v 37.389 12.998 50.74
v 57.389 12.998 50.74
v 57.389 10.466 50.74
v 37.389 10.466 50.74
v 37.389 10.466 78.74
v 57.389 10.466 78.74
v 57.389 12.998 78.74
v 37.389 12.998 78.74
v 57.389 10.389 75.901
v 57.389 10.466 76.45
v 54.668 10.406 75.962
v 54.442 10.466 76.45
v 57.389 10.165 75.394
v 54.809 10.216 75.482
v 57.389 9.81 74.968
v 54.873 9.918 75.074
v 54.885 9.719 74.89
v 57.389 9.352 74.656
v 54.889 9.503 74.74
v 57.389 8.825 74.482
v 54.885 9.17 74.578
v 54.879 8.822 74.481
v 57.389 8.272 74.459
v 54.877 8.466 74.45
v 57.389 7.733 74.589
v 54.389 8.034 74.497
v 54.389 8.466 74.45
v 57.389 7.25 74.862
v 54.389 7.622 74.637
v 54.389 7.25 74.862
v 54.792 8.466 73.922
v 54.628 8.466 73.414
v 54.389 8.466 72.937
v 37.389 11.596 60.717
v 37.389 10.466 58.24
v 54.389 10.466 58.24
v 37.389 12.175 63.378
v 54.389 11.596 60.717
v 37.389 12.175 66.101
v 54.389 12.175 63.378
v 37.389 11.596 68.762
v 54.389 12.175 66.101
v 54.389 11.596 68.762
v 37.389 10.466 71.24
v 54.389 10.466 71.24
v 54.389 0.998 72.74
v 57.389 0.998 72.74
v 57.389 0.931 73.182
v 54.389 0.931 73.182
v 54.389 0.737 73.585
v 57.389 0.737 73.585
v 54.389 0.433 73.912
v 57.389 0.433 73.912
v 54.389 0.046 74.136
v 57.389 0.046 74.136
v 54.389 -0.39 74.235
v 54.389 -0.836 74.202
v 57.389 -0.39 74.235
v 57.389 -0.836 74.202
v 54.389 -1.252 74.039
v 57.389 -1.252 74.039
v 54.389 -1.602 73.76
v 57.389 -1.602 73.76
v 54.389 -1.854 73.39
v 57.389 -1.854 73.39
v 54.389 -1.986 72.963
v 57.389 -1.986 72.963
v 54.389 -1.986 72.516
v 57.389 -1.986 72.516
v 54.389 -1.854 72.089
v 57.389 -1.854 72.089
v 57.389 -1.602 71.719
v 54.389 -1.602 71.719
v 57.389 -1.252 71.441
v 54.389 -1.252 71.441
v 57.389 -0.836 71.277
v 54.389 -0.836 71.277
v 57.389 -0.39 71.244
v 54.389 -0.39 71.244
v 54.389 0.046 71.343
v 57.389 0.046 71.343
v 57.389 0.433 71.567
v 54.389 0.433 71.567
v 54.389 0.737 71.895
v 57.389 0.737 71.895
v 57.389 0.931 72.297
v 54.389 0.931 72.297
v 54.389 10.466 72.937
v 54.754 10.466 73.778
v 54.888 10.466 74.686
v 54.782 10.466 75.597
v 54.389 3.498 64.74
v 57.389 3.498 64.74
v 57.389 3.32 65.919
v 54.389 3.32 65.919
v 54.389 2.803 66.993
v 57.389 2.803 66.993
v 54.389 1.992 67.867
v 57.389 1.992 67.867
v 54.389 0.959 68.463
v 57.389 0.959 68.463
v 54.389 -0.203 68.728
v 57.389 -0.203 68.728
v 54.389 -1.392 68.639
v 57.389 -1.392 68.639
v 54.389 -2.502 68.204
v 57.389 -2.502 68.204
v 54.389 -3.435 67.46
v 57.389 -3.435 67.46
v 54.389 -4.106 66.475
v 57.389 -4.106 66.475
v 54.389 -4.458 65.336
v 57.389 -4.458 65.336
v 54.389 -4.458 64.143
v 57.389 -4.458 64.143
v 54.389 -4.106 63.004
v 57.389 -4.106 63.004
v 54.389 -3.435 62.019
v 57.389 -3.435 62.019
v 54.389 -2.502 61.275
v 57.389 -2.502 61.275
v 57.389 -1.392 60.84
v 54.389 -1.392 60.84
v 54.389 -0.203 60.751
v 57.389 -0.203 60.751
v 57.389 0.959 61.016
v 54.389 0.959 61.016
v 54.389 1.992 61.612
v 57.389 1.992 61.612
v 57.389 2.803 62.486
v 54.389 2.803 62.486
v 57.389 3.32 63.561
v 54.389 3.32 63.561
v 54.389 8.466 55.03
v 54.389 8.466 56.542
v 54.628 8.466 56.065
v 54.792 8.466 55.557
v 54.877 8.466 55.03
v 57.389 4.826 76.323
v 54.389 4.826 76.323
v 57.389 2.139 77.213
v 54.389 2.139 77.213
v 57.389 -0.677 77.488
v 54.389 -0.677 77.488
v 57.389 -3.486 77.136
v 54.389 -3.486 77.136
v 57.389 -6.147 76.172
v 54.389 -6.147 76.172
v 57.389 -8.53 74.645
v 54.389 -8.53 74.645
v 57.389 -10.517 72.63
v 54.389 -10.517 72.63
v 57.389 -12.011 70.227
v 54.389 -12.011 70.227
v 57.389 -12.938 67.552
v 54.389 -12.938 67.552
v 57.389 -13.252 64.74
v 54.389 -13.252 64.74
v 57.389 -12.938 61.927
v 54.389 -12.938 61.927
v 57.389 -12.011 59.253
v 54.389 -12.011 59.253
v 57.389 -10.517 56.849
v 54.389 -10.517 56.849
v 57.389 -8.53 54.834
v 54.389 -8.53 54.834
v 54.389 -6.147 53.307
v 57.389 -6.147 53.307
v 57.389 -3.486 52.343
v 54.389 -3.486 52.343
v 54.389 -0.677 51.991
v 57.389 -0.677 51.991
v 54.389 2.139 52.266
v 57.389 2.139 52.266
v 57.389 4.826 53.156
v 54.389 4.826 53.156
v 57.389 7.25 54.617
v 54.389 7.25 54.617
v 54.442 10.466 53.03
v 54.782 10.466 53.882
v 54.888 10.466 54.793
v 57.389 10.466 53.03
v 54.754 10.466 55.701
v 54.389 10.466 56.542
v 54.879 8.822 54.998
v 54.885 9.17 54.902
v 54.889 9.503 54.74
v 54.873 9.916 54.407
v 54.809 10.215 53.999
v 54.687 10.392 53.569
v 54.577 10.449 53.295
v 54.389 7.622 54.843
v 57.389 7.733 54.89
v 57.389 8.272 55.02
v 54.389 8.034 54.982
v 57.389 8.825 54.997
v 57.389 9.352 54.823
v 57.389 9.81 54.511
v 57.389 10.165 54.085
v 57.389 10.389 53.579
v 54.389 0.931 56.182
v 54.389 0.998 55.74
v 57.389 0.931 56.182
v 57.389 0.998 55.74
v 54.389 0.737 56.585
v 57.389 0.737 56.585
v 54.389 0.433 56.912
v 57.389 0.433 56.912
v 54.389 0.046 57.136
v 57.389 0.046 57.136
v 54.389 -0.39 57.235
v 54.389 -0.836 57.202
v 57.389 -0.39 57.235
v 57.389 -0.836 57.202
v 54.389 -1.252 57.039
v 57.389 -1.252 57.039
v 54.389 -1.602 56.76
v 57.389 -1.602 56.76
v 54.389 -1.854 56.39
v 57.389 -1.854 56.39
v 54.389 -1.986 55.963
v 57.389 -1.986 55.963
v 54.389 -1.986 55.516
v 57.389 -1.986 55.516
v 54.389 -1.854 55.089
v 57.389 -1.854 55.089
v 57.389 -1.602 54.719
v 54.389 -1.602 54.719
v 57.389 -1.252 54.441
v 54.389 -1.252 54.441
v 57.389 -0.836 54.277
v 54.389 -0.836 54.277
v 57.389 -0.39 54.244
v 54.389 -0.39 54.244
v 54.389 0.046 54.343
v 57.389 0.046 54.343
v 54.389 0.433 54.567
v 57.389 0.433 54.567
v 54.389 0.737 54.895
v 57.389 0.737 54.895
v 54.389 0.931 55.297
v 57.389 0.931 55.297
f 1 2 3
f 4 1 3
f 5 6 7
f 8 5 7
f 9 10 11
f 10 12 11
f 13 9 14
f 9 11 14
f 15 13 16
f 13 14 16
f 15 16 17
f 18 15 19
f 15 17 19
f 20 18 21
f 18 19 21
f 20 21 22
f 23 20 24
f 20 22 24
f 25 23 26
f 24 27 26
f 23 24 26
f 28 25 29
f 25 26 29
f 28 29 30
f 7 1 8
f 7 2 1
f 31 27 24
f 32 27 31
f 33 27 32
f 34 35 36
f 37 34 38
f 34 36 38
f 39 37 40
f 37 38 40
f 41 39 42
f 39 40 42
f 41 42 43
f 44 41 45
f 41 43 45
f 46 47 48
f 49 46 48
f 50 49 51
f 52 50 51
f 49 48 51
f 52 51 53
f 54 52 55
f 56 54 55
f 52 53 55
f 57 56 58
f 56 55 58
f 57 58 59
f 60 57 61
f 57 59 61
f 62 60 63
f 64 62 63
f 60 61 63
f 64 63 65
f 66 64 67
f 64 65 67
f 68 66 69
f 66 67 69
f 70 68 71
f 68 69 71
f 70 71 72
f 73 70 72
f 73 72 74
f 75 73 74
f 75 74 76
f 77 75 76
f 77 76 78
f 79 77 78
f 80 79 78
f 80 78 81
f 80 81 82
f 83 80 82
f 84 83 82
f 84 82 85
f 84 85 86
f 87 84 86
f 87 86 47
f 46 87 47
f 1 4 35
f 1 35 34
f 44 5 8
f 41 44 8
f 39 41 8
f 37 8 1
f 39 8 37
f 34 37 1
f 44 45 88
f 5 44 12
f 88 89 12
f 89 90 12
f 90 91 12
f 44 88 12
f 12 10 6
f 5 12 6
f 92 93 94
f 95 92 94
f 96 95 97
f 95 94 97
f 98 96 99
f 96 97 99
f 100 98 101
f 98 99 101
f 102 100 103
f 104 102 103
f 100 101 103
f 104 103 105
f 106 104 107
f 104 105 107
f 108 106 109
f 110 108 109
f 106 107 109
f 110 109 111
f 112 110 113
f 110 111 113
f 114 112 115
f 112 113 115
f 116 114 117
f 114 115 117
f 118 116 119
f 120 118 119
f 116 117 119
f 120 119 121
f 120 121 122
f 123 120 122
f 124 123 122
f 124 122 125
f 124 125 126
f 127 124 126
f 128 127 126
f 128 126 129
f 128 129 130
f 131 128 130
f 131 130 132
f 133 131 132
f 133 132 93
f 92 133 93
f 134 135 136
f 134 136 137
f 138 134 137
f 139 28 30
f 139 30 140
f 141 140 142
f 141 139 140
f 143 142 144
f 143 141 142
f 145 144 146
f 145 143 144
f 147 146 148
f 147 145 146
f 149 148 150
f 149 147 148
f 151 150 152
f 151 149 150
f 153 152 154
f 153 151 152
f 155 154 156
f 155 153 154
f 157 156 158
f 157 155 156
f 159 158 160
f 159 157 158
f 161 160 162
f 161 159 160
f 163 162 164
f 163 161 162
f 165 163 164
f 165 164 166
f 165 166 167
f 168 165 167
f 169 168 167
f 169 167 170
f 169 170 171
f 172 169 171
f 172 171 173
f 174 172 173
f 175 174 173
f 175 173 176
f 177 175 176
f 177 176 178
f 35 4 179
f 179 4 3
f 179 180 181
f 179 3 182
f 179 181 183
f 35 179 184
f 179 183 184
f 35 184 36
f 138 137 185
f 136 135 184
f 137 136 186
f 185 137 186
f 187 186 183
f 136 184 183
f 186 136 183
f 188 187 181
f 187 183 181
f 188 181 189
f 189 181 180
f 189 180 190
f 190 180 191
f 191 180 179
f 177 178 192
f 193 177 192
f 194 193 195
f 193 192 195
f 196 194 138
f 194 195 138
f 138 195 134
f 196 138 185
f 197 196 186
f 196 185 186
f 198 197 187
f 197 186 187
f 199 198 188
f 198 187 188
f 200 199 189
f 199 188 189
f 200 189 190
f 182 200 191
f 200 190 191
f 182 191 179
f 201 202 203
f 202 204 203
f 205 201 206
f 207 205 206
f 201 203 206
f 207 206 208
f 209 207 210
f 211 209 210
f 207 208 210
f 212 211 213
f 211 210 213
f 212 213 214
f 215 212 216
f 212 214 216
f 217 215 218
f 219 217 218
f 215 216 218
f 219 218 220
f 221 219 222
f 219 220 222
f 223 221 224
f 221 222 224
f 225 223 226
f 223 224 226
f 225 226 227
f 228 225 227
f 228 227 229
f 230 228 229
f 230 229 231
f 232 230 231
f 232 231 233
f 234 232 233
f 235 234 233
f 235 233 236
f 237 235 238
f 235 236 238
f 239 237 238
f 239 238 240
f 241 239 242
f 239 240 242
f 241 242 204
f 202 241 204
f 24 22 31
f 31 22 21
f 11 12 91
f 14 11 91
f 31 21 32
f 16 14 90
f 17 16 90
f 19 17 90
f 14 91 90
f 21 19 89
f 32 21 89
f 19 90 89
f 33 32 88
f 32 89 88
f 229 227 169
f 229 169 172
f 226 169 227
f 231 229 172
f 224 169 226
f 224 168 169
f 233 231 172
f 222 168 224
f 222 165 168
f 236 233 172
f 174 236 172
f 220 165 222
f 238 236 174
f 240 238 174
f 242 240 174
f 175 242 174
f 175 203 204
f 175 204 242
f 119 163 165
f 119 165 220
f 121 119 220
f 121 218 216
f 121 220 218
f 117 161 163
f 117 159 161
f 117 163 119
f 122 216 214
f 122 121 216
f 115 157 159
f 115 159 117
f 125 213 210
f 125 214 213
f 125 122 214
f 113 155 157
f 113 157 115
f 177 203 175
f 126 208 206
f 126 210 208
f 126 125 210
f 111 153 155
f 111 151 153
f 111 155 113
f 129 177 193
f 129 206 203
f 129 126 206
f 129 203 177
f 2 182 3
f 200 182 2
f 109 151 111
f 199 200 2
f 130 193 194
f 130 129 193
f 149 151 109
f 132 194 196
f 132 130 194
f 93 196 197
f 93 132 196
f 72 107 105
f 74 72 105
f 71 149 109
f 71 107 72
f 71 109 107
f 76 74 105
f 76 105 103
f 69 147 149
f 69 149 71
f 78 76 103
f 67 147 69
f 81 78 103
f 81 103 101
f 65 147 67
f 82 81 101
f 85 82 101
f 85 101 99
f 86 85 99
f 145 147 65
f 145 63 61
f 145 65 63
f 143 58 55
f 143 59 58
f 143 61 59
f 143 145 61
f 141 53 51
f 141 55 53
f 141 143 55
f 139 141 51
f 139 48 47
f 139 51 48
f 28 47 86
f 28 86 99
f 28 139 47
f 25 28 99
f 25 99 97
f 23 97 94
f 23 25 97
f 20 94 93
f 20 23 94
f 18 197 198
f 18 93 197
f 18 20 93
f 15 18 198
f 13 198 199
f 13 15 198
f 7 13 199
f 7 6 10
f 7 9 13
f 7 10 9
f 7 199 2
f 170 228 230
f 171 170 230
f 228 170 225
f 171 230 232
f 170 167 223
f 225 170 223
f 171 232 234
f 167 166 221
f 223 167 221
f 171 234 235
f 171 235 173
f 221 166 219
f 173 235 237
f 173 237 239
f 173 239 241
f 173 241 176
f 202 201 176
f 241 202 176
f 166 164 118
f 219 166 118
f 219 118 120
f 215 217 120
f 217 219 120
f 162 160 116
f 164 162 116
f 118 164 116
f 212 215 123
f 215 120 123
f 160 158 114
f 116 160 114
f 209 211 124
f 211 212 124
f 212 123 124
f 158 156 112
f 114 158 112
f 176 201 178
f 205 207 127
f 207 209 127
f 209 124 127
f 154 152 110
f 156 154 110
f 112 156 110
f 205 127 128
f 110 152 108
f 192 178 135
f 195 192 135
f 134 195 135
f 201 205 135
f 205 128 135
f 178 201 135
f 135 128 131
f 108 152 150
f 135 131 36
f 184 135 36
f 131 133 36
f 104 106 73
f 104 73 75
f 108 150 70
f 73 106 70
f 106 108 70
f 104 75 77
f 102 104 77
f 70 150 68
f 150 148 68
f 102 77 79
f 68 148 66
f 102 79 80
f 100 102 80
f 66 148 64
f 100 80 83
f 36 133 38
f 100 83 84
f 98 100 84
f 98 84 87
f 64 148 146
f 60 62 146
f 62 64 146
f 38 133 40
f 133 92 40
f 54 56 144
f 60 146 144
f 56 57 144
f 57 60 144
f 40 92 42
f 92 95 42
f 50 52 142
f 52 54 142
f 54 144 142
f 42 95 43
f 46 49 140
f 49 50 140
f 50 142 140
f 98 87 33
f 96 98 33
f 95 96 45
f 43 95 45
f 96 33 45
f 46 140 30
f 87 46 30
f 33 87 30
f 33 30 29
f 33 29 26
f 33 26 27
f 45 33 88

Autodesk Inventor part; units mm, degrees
ref_plane "YZ Plane" through (0, 0, 0) normal (1, 0, 0) x (0, 1, 0)
ref_plane "XZ Plane" through (0, 0, 0) normal (0, 1, 0) x (-1, 0, 0)
ref_plane "XY Plane" through (0, 0, 0) normal (0, 0, 1) x (1, 0, 0)
ref_plane "РабПлоскость1" through (57.3886, 15.9976, 24.7396) normal (1, 0, 0) x (0, 1, 0)
sketch "Эскиз1" plane through (57.3886, 15.9976, 24.7396) normal (1, 0, 0) x (0, 1, 0)
  circle A0 centre (-16.5, 48) radius 1.5
  circle A1 centre (-16.5, 31) radius 1.5
  circle A2 centre (-16.5, 40) radius 4
  line L0 (-3, 26) -> (-3, 54)
  circle A3 centre (-16.5, 40) radius 12.75
  line L1 (-3, 54) -> (-3, 26)
  line L2 (-3, 27.25) -> (-3, 52.75)
  line L3 (-3, 26) -> (-29.25, 26)
  line L4 (-29.25, 26) -> (-29.25, 54)
  line L5 (-29.25, 54) -> (-3, 54)
  line L6 (-3, 54) -> (-3, 26)
  line L7 (-5.5313, 46.5) -> (-5.5313, 54)
  line L8 (-3, 54) -> (-3, 26)
  line L9 (-5.5313, 26) -> (-5.5313, 33.5)
  point P0 (-15.9976, -24.7396)
  point P1 (-3, 26)
  dimension "d15" = 25.5
extrude "Выдавливание1" add sketch "Эскиз1" against normal blind 3 contours A3
extrude "Выдавливание2" add sketch "Эскиз1" against normal blind 20 contours L3 L9 A3 L7 L5 L0
fillet "Сопряжение1" radius 2 1 edges at (55.8886, 10.4663, 58.2396)
fillet "Сопряжение2" radius 2 1 edges at (55.8886, 10.4663, 71.2396)
sketch "Эскиз2" plane through (57.3886, 12.9976, 78.7396) normal (0, 1, 0) x (1, 0, 0)
  point P0 (-57.3886, 78.7396)
sketch "Эскиз4" plane through (57.3886, 12.9976, 78.7396) normal (0, 1, 0) x (1, 0, 0)
  circle A0 centre (-6, 24) radius 1.5 projected
  circle A1 centre (-6, 24) radius 3.5
  circle A2 centre (-6, 4) radius 1.5 projected
  circle A3 centre (-6, 4) radius 3.5
  circle A4 centre (-16, 4) radius 1.5 projected
  circle A5 centre (-16, 4) radius 3.5
  circle A6 centre (-16, 24) radius 1.5 projected
  circle A7 centre (-16, 24) radius 3.5
  point P0 (-57.3886, 78.7396)
  dimension "d33" = 7
  dimension "d34" = 7
  dimension "d35" = 7
  dimension "d36" = 7
extrude "Выдавливание5" cut sketch "Эскиз4" against normal blind 2 from surface at -2.5313
properties part number "крепёж_мотора_прототип"
